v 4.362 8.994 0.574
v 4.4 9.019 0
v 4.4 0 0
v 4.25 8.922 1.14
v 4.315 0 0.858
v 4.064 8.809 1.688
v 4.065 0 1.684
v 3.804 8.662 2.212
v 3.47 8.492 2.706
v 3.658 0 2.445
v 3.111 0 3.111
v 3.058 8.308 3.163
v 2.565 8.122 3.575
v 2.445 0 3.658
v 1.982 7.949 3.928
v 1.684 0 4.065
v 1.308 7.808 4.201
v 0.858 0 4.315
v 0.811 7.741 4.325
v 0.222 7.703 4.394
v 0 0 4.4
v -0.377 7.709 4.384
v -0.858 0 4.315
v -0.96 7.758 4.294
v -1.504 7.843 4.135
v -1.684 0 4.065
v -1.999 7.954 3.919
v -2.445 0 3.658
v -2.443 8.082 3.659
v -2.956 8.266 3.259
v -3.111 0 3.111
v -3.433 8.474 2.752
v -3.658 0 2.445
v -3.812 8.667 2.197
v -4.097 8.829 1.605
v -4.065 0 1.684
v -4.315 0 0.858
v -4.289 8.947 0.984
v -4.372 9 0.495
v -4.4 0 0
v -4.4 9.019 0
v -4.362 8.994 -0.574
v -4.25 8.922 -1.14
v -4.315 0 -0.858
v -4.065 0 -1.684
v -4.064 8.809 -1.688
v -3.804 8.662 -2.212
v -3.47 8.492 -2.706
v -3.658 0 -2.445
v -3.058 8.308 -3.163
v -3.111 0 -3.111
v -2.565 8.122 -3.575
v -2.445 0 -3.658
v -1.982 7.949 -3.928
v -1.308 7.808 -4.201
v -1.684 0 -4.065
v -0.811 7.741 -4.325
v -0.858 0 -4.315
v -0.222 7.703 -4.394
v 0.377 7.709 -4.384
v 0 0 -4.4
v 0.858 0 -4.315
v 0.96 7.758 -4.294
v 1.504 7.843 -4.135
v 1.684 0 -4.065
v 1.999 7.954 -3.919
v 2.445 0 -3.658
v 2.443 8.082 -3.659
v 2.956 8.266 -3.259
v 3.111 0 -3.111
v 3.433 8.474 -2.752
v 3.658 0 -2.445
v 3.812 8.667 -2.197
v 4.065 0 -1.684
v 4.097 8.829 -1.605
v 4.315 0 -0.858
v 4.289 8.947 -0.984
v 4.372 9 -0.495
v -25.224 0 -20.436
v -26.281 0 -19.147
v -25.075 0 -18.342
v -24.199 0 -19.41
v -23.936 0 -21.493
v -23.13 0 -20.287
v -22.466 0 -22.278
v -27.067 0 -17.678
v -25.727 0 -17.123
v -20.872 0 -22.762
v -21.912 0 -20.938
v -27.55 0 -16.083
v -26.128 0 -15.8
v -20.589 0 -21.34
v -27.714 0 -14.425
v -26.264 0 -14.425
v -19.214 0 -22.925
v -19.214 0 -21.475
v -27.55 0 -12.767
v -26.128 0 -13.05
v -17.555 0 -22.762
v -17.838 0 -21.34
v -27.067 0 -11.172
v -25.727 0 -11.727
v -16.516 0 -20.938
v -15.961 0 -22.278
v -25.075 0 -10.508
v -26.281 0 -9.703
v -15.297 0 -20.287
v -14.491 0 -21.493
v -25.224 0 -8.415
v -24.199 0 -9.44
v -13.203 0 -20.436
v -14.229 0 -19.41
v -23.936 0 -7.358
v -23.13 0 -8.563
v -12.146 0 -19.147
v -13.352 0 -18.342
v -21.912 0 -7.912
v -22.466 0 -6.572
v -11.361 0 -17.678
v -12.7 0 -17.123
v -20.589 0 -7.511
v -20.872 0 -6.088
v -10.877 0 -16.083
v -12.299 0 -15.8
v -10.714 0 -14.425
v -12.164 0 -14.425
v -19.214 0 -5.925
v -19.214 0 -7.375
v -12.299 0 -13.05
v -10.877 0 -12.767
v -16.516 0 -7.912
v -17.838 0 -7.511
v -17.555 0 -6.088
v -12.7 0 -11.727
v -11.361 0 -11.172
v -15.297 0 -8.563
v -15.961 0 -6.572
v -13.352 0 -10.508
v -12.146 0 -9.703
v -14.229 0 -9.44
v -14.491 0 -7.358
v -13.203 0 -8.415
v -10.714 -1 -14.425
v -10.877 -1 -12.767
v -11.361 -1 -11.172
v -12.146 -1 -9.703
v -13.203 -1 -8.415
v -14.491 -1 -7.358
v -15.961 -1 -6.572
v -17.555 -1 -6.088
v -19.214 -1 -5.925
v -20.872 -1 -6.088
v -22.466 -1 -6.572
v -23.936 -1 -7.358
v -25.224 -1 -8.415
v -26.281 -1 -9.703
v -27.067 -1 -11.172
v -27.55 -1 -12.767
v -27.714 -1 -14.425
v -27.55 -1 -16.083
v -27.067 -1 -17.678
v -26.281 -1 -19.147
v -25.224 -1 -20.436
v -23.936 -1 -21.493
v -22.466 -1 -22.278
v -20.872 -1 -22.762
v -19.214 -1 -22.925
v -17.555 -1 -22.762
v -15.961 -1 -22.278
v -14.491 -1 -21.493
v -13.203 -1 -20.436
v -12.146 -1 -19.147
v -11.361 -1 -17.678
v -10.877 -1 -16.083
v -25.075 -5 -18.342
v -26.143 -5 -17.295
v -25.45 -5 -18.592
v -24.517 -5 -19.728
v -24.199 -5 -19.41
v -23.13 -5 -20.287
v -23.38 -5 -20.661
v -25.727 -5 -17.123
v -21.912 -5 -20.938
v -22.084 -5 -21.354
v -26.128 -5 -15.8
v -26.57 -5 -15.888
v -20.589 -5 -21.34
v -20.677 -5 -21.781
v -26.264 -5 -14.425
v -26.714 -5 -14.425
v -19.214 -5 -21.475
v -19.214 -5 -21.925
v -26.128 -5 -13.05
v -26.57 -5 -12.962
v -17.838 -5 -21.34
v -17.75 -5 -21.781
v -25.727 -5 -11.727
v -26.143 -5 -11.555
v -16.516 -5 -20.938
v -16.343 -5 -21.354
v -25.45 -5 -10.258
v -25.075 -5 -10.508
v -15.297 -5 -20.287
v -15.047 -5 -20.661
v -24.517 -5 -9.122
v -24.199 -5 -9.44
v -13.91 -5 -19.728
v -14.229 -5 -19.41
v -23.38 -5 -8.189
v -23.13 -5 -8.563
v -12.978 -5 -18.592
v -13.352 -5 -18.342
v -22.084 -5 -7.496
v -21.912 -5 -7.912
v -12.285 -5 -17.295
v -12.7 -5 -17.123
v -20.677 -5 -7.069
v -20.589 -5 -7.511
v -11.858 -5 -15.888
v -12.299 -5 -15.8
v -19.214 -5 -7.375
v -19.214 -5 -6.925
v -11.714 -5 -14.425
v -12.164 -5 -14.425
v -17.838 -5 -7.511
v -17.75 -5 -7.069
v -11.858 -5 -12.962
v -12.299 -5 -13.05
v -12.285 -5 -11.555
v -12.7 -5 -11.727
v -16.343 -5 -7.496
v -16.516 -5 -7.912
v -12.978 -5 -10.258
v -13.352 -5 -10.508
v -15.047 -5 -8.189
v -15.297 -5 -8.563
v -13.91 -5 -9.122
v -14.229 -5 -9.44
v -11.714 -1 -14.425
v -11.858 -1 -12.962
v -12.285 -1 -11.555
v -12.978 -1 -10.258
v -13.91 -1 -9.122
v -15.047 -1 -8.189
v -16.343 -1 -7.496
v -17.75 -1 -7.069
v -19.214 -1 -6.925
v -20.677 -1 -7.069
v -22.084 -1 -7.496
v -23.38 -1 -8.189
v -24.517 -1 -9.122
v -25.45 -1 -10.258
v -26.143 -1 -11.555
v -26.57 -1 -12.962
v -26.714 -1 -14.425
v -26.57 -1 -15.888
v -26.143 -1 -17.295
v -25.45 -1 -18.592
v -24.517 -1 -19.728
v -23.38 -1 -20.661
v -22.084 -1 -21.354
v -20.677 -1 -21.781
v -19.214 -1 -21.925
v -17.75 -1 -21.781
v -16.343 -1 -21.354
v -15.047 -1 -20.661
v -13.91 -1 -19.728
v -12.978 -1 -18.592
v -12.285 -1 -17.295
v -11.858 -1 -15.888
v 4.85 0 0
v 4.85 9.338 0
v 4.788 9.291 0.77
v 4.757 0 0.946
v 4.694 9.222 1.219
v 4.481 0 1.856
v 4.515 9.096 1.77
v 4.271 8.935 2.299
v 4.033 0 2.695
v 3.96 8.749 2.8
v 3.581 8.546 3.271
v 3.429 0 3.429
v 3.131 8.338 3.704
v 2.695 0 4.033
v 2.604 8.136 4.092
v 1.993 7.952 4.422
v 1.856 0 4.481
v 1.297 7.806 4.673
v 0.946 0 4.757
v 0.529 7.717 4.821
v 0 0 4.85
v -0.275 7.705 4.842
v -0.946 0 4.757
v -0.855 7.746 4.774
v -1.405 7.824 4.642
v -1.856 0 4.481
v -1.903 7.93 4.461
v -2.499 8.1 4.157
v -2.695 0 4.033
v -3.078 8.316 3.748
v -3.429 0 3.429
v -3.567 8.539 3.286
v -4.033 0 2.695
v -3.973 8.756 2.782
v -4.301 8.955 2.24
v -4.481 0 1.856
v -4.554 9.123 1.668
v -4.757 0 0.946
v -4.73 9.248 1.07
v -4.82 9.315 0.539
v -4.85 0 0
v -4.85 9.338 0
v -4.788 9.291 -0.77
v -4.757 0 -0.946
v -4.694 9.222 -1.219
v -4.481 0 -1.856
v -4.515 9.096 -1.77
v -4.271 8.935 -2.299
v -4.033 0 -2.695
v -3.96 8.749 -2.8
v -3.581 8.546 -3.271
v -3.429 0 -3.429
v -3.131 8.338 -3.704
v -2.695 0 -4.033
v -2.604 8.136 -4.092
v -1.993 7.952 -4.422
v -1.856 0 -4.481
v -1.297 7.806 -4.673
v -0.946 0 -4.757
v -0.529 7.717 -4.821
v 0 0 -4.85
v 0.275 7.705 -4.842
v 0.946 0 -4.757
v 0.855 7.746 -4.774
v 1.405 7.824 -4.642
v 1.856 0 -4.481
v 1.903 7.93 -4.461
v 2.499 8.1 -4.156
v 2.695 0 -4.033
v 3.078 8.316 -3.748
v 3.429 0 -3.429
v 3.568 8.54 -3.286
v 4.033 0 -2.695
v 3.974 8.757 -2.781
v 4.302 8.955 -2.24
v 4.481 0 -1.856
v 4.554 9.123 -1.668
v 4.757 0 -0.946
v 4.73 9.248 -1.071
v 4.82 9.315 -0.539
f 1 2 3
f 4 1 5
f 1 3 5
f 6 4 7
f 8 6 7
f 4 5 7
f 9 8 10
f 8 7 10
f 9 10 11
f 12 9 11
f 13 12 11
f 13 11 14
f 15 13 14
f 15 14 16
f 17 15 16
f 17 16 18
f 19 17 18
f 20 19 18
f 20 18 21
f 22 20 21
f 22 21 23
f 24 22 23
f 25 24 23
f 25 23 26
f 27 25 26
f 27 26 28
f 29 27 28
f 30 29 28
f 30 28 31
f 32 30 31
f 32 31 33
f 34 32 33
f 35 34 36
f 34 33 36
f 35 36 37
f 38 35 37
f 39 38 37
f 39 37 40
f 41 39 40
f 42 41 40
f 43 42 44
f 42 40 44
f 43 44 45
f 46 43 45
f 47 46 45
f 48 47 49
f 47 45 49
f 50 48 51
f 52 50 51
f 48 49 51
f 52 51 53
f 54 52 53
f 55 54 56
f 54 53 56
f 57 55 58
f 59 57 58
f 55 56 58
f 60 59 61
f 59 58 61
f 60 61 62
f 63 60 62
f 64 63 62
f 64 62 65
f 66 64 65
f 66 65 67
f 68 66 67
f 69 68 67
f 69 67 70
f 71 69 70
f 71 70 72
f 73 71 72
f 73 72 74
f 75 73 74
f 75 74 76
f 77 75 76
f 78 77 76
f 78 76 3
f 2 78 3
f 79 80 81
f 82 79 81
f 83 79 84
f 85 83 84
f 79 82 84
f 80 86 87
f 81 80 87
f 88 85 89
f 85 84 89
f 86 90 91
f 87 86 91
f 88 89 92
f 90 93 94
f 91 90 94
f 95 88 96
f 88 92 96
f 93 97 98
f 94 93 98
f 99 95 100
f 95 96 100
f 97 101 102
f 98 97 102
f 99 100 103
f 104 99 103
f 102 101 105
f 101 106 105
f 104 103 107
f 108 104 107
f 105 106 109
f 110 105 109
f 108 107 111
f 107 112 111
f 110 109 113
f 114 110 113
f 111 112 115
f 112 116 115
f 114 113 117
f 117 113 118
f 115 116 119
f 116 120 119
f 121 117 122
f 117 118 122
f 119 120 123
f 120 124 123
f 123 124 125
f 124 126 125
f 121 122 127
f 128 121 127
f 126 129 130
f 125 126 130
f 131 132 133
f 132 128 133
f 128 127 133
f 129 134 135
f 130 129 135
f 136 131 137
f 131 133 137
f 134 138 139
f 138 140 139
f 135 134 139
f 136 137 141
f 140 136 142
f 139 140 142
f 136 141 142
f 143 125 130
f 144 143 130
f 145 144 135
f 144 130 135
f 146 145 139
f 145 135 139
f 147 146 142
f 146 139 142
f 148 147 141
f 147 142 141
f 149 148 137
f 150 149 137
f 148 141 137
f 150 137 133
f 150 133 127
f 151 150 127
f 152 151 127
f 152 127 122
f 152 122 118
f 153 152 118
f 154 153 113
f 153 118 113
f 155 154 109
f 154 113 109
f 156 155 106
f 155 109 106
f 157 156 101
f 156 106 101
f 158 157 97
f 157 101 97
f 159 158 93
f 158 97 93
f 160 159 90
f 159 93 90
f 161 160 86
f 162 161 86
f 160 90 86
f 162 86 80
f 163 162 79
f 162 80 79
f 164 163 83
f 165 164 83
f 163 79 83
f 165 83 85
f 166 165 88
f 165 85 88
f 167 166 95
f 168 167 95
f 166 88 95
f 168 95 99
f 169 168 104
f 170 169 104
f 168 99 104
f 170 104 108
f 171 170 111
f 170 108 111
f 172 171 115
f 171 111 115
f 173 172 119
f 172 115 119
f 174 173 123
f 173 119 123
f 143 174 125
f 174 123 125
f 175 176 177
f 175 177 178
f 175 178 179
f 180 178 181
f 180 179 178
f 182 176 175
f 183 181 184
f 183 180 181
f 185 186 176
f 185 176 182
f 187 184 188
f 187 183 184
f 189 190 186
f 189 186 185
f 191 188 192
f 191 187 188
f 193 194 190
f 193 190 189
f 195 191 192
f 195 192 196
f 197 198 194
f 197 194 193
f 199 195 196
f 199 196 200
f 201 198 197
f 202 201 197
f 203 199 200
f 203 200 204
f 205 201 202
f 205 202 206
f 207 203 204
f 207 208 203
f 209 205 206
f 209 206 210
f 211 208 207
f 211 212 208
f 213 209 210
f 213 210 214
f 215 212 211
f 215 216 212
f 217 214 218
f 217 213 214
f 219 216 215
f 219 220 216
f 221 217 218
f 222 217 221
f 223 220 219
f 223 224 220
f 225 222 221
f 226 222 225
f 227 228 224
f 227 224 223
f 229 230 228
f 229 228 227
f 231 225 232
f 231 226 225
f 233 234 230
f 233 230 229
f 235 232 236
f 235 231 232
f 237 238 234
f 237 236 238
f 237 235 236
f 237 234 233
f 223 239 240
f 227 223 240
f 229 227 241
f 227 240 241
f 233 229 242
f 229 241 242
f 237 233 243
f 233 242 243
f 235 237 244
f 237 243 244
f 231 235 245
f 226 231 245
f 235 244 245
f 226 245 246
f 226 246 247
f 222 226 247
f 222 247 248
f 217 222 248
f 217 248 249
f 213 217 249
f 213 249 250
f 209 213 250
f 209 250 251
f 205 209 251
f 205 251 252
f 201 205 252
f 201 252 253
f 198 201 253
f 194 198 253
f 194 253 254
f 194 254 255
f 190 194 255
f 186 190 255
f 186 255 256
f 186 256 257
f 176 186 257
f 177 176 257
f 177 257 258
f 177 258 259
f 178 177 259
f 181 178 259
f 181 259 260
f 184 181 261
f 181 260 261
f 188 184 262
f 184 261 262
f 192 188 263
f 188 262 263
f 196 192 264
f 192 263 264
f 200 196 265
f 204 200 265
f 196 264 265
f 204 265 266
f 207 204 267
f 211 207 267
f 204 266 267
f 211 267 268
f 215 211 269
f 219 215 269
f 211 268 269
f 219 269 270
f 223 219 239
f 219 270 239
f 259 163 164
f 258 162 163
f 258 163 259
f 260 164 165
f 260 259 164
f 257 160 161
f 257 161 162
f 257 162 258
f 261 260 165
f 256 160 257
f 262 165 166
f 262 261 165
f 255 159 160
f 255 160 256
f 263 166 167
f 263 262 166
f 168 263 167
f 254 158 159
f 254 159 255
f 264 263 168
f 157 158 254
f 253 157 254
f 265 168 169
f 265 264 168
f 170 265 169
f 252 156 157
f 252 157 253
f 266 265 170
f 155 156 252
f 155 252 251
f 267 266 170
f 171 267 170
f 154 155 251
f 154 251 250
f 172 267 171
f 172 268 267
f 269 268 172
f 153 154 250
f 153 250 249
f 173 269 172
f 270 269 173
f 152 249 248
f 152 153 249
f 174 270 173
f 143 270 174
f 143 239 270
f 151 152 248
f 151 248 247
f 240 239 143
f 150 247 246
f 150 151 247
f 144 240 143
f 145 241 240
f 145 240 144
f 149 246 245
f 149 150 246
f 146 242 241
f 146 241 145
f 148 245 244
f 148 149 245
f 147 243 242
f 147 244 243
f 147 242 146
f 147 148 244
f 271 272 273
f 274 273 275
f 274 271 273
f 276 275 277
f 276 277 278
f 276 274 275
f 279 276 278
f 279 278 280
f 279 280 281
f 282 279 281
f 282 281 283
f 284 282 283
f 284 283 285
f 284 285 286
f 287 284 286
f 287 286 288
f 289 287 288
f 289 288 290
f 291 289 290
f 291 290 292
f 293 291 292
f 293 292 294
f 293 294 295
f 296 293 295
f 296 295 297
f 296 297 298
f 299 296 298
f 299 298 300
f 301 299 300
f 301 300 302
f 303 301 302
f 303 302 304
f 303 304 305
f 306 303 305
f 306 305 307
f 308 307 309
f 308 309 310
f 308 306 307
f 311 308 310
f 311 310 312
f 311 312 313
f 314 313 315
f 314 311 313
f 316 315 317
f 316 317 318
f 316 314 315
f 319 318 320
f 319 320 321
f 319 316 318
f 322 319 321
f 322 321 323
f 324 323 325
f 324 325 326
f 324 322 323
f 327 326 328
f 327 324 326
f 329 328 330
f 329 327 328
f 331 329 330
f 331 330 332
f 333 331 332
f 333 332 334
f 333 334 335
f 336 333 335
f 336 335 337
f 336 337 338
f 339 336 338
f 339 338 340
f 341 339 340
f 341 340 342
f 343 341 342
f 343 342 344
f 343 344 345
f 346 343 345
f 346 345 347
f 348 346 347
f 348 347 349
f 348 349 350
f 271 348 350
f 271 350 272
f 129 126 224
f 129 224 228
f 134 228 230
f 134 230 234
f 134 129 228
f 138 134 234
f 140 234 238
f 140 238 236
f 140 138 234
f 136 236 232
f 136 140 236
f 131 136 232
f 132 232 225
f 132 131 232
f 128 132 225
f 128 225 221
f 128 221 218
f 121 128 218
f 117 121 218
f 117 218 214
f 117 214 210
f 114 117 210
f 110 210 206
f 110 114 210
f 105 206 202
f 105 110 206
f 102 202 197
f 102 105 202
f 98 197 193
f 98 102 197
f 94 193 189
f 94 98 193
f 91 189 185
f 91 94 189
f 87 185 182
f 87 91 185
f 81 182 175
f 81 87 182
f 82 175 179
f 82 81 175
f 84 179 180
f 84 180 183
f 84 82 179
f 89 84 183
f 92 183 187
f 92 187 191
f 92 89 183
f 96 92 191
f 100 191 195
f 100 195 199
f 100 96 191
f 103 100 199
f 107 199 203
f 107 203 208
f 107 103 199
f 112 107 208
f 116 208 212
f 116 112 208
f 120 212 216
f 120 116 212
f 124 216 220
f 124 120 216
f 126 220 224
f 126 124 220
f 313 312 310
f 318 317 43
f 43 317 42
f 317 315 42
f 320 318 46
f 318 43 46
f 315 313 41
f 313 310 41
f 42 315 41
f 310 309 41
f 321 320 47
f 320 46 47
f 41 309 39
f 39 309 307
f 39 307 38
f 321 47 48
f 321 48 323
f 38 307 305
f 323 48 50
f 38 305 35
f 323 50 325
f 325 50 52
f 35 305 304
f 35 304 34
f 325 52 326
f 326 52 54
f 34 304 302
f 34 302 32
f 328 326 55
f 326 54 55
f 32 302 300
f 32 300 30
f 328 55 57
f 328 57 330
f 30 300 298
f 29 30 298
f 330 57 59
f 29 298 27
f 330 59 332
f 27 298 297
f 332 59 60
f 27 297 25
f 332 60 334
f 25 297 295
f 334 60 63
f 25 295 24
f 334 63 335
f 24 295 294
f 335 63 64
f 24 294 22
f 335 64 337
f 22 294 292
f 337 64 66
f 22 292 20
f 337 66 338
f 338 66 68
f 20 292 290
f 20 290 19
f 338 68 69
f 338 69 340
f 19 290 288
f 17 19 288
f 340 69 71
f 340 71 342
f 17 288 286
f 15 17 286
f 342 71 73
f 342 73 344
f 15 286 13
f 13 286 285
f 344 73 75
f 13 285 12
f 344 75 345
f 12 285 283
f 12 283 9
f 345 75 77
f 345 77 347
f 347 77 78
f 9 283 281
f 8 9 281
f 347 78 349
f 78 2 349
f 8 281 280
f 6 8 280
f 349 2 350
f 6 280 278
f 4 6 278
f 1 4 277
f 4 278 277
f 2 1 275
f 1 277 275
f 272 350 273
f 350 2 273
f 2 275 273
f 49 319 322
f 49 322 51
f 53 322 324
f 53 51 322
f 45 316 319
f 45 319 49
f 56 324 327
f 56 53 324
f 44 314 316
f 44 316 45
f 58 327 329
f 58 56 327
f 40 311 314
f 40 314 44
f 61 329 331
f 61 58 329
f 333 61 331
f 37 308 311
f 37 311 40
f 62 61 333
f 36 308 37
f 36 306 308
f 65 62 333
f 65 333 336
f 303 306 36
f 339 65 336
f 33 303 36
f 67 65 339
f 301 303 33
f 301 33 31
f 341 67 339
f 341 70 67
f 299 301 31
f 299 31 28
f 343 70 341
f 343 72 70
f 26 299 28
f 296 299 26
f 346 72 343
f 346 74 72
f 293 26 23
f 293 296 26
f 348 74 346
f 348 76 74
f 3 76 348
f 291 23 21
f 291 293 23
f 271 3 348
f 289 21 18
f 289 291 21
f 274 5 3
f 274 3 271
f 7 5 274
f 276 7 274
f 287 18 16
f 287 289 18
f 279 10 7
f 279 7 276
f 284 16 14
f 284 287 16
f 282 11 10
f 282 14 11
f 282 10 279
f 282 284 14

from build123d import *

# Parameters (mm, degrees)
F0_R          = 4.85
F0_R_2        = 4.4
F1_DEPTH      = 10
F2_R          = 8
F3_DEPTH      = 25
F3_DEPTH_BACK = 25
F4_R          = 7.5
F4_R_2        = 7.05
F5_DEPTH      = 5
F4_R_3        = 8.5
F6_DEPTH      = 1


with BuildPart() as f1:
    # F0 (on Front) → F1 (new body)
    with BuildSketch(Plane.XZ):
        Circle(F0_R)
        Circle(F0_R_2, mode=Mode.SUBTRACT)
    extrude(amount=-F1_DEPTH)

    # F2 (on Top) → F3 (cut, two sides)
    with BuildSketch(Plane.XY) as f3_sk:
        with Locations((0, 15.7)):
            Circle(F2_R)
    extrude(amount=-F3_DEPTH, mode=Mode.SUBTRACT)
    extrude(f3_sk.sketch, amount=F3_DEPTH_BACK, mode=Mode.SUBTRACT)


with BuildPart() as f5:
    # F4 (on Front) → F5 (new body)
    with BuildSketch(Plane.XZ):
        with Locations((-19.2136187106, -14.4250961021)):
            Circle(F4_R)
        with Locations((-19.2136187106, -14.4250961021)):
            Circle(F4_R_2, mode=Mode.SUBTRACT)
    extrude(amount=F5_DEPTH)

    # F4 (on Front) → F6 (join)
    with BuildSketch(Plane.XZ):
        with Locations((-19.2136187106, -14.4250961021)):
            Circle(F4_R_3)
        with Locations((-19.2136187106, -14.4250961021)):
            Circle(F4_R, mode=Mode.SUBTRACT)
    extrude(amount=F6_DEPTH)


solid = Compound([f1.part, f5.part])
